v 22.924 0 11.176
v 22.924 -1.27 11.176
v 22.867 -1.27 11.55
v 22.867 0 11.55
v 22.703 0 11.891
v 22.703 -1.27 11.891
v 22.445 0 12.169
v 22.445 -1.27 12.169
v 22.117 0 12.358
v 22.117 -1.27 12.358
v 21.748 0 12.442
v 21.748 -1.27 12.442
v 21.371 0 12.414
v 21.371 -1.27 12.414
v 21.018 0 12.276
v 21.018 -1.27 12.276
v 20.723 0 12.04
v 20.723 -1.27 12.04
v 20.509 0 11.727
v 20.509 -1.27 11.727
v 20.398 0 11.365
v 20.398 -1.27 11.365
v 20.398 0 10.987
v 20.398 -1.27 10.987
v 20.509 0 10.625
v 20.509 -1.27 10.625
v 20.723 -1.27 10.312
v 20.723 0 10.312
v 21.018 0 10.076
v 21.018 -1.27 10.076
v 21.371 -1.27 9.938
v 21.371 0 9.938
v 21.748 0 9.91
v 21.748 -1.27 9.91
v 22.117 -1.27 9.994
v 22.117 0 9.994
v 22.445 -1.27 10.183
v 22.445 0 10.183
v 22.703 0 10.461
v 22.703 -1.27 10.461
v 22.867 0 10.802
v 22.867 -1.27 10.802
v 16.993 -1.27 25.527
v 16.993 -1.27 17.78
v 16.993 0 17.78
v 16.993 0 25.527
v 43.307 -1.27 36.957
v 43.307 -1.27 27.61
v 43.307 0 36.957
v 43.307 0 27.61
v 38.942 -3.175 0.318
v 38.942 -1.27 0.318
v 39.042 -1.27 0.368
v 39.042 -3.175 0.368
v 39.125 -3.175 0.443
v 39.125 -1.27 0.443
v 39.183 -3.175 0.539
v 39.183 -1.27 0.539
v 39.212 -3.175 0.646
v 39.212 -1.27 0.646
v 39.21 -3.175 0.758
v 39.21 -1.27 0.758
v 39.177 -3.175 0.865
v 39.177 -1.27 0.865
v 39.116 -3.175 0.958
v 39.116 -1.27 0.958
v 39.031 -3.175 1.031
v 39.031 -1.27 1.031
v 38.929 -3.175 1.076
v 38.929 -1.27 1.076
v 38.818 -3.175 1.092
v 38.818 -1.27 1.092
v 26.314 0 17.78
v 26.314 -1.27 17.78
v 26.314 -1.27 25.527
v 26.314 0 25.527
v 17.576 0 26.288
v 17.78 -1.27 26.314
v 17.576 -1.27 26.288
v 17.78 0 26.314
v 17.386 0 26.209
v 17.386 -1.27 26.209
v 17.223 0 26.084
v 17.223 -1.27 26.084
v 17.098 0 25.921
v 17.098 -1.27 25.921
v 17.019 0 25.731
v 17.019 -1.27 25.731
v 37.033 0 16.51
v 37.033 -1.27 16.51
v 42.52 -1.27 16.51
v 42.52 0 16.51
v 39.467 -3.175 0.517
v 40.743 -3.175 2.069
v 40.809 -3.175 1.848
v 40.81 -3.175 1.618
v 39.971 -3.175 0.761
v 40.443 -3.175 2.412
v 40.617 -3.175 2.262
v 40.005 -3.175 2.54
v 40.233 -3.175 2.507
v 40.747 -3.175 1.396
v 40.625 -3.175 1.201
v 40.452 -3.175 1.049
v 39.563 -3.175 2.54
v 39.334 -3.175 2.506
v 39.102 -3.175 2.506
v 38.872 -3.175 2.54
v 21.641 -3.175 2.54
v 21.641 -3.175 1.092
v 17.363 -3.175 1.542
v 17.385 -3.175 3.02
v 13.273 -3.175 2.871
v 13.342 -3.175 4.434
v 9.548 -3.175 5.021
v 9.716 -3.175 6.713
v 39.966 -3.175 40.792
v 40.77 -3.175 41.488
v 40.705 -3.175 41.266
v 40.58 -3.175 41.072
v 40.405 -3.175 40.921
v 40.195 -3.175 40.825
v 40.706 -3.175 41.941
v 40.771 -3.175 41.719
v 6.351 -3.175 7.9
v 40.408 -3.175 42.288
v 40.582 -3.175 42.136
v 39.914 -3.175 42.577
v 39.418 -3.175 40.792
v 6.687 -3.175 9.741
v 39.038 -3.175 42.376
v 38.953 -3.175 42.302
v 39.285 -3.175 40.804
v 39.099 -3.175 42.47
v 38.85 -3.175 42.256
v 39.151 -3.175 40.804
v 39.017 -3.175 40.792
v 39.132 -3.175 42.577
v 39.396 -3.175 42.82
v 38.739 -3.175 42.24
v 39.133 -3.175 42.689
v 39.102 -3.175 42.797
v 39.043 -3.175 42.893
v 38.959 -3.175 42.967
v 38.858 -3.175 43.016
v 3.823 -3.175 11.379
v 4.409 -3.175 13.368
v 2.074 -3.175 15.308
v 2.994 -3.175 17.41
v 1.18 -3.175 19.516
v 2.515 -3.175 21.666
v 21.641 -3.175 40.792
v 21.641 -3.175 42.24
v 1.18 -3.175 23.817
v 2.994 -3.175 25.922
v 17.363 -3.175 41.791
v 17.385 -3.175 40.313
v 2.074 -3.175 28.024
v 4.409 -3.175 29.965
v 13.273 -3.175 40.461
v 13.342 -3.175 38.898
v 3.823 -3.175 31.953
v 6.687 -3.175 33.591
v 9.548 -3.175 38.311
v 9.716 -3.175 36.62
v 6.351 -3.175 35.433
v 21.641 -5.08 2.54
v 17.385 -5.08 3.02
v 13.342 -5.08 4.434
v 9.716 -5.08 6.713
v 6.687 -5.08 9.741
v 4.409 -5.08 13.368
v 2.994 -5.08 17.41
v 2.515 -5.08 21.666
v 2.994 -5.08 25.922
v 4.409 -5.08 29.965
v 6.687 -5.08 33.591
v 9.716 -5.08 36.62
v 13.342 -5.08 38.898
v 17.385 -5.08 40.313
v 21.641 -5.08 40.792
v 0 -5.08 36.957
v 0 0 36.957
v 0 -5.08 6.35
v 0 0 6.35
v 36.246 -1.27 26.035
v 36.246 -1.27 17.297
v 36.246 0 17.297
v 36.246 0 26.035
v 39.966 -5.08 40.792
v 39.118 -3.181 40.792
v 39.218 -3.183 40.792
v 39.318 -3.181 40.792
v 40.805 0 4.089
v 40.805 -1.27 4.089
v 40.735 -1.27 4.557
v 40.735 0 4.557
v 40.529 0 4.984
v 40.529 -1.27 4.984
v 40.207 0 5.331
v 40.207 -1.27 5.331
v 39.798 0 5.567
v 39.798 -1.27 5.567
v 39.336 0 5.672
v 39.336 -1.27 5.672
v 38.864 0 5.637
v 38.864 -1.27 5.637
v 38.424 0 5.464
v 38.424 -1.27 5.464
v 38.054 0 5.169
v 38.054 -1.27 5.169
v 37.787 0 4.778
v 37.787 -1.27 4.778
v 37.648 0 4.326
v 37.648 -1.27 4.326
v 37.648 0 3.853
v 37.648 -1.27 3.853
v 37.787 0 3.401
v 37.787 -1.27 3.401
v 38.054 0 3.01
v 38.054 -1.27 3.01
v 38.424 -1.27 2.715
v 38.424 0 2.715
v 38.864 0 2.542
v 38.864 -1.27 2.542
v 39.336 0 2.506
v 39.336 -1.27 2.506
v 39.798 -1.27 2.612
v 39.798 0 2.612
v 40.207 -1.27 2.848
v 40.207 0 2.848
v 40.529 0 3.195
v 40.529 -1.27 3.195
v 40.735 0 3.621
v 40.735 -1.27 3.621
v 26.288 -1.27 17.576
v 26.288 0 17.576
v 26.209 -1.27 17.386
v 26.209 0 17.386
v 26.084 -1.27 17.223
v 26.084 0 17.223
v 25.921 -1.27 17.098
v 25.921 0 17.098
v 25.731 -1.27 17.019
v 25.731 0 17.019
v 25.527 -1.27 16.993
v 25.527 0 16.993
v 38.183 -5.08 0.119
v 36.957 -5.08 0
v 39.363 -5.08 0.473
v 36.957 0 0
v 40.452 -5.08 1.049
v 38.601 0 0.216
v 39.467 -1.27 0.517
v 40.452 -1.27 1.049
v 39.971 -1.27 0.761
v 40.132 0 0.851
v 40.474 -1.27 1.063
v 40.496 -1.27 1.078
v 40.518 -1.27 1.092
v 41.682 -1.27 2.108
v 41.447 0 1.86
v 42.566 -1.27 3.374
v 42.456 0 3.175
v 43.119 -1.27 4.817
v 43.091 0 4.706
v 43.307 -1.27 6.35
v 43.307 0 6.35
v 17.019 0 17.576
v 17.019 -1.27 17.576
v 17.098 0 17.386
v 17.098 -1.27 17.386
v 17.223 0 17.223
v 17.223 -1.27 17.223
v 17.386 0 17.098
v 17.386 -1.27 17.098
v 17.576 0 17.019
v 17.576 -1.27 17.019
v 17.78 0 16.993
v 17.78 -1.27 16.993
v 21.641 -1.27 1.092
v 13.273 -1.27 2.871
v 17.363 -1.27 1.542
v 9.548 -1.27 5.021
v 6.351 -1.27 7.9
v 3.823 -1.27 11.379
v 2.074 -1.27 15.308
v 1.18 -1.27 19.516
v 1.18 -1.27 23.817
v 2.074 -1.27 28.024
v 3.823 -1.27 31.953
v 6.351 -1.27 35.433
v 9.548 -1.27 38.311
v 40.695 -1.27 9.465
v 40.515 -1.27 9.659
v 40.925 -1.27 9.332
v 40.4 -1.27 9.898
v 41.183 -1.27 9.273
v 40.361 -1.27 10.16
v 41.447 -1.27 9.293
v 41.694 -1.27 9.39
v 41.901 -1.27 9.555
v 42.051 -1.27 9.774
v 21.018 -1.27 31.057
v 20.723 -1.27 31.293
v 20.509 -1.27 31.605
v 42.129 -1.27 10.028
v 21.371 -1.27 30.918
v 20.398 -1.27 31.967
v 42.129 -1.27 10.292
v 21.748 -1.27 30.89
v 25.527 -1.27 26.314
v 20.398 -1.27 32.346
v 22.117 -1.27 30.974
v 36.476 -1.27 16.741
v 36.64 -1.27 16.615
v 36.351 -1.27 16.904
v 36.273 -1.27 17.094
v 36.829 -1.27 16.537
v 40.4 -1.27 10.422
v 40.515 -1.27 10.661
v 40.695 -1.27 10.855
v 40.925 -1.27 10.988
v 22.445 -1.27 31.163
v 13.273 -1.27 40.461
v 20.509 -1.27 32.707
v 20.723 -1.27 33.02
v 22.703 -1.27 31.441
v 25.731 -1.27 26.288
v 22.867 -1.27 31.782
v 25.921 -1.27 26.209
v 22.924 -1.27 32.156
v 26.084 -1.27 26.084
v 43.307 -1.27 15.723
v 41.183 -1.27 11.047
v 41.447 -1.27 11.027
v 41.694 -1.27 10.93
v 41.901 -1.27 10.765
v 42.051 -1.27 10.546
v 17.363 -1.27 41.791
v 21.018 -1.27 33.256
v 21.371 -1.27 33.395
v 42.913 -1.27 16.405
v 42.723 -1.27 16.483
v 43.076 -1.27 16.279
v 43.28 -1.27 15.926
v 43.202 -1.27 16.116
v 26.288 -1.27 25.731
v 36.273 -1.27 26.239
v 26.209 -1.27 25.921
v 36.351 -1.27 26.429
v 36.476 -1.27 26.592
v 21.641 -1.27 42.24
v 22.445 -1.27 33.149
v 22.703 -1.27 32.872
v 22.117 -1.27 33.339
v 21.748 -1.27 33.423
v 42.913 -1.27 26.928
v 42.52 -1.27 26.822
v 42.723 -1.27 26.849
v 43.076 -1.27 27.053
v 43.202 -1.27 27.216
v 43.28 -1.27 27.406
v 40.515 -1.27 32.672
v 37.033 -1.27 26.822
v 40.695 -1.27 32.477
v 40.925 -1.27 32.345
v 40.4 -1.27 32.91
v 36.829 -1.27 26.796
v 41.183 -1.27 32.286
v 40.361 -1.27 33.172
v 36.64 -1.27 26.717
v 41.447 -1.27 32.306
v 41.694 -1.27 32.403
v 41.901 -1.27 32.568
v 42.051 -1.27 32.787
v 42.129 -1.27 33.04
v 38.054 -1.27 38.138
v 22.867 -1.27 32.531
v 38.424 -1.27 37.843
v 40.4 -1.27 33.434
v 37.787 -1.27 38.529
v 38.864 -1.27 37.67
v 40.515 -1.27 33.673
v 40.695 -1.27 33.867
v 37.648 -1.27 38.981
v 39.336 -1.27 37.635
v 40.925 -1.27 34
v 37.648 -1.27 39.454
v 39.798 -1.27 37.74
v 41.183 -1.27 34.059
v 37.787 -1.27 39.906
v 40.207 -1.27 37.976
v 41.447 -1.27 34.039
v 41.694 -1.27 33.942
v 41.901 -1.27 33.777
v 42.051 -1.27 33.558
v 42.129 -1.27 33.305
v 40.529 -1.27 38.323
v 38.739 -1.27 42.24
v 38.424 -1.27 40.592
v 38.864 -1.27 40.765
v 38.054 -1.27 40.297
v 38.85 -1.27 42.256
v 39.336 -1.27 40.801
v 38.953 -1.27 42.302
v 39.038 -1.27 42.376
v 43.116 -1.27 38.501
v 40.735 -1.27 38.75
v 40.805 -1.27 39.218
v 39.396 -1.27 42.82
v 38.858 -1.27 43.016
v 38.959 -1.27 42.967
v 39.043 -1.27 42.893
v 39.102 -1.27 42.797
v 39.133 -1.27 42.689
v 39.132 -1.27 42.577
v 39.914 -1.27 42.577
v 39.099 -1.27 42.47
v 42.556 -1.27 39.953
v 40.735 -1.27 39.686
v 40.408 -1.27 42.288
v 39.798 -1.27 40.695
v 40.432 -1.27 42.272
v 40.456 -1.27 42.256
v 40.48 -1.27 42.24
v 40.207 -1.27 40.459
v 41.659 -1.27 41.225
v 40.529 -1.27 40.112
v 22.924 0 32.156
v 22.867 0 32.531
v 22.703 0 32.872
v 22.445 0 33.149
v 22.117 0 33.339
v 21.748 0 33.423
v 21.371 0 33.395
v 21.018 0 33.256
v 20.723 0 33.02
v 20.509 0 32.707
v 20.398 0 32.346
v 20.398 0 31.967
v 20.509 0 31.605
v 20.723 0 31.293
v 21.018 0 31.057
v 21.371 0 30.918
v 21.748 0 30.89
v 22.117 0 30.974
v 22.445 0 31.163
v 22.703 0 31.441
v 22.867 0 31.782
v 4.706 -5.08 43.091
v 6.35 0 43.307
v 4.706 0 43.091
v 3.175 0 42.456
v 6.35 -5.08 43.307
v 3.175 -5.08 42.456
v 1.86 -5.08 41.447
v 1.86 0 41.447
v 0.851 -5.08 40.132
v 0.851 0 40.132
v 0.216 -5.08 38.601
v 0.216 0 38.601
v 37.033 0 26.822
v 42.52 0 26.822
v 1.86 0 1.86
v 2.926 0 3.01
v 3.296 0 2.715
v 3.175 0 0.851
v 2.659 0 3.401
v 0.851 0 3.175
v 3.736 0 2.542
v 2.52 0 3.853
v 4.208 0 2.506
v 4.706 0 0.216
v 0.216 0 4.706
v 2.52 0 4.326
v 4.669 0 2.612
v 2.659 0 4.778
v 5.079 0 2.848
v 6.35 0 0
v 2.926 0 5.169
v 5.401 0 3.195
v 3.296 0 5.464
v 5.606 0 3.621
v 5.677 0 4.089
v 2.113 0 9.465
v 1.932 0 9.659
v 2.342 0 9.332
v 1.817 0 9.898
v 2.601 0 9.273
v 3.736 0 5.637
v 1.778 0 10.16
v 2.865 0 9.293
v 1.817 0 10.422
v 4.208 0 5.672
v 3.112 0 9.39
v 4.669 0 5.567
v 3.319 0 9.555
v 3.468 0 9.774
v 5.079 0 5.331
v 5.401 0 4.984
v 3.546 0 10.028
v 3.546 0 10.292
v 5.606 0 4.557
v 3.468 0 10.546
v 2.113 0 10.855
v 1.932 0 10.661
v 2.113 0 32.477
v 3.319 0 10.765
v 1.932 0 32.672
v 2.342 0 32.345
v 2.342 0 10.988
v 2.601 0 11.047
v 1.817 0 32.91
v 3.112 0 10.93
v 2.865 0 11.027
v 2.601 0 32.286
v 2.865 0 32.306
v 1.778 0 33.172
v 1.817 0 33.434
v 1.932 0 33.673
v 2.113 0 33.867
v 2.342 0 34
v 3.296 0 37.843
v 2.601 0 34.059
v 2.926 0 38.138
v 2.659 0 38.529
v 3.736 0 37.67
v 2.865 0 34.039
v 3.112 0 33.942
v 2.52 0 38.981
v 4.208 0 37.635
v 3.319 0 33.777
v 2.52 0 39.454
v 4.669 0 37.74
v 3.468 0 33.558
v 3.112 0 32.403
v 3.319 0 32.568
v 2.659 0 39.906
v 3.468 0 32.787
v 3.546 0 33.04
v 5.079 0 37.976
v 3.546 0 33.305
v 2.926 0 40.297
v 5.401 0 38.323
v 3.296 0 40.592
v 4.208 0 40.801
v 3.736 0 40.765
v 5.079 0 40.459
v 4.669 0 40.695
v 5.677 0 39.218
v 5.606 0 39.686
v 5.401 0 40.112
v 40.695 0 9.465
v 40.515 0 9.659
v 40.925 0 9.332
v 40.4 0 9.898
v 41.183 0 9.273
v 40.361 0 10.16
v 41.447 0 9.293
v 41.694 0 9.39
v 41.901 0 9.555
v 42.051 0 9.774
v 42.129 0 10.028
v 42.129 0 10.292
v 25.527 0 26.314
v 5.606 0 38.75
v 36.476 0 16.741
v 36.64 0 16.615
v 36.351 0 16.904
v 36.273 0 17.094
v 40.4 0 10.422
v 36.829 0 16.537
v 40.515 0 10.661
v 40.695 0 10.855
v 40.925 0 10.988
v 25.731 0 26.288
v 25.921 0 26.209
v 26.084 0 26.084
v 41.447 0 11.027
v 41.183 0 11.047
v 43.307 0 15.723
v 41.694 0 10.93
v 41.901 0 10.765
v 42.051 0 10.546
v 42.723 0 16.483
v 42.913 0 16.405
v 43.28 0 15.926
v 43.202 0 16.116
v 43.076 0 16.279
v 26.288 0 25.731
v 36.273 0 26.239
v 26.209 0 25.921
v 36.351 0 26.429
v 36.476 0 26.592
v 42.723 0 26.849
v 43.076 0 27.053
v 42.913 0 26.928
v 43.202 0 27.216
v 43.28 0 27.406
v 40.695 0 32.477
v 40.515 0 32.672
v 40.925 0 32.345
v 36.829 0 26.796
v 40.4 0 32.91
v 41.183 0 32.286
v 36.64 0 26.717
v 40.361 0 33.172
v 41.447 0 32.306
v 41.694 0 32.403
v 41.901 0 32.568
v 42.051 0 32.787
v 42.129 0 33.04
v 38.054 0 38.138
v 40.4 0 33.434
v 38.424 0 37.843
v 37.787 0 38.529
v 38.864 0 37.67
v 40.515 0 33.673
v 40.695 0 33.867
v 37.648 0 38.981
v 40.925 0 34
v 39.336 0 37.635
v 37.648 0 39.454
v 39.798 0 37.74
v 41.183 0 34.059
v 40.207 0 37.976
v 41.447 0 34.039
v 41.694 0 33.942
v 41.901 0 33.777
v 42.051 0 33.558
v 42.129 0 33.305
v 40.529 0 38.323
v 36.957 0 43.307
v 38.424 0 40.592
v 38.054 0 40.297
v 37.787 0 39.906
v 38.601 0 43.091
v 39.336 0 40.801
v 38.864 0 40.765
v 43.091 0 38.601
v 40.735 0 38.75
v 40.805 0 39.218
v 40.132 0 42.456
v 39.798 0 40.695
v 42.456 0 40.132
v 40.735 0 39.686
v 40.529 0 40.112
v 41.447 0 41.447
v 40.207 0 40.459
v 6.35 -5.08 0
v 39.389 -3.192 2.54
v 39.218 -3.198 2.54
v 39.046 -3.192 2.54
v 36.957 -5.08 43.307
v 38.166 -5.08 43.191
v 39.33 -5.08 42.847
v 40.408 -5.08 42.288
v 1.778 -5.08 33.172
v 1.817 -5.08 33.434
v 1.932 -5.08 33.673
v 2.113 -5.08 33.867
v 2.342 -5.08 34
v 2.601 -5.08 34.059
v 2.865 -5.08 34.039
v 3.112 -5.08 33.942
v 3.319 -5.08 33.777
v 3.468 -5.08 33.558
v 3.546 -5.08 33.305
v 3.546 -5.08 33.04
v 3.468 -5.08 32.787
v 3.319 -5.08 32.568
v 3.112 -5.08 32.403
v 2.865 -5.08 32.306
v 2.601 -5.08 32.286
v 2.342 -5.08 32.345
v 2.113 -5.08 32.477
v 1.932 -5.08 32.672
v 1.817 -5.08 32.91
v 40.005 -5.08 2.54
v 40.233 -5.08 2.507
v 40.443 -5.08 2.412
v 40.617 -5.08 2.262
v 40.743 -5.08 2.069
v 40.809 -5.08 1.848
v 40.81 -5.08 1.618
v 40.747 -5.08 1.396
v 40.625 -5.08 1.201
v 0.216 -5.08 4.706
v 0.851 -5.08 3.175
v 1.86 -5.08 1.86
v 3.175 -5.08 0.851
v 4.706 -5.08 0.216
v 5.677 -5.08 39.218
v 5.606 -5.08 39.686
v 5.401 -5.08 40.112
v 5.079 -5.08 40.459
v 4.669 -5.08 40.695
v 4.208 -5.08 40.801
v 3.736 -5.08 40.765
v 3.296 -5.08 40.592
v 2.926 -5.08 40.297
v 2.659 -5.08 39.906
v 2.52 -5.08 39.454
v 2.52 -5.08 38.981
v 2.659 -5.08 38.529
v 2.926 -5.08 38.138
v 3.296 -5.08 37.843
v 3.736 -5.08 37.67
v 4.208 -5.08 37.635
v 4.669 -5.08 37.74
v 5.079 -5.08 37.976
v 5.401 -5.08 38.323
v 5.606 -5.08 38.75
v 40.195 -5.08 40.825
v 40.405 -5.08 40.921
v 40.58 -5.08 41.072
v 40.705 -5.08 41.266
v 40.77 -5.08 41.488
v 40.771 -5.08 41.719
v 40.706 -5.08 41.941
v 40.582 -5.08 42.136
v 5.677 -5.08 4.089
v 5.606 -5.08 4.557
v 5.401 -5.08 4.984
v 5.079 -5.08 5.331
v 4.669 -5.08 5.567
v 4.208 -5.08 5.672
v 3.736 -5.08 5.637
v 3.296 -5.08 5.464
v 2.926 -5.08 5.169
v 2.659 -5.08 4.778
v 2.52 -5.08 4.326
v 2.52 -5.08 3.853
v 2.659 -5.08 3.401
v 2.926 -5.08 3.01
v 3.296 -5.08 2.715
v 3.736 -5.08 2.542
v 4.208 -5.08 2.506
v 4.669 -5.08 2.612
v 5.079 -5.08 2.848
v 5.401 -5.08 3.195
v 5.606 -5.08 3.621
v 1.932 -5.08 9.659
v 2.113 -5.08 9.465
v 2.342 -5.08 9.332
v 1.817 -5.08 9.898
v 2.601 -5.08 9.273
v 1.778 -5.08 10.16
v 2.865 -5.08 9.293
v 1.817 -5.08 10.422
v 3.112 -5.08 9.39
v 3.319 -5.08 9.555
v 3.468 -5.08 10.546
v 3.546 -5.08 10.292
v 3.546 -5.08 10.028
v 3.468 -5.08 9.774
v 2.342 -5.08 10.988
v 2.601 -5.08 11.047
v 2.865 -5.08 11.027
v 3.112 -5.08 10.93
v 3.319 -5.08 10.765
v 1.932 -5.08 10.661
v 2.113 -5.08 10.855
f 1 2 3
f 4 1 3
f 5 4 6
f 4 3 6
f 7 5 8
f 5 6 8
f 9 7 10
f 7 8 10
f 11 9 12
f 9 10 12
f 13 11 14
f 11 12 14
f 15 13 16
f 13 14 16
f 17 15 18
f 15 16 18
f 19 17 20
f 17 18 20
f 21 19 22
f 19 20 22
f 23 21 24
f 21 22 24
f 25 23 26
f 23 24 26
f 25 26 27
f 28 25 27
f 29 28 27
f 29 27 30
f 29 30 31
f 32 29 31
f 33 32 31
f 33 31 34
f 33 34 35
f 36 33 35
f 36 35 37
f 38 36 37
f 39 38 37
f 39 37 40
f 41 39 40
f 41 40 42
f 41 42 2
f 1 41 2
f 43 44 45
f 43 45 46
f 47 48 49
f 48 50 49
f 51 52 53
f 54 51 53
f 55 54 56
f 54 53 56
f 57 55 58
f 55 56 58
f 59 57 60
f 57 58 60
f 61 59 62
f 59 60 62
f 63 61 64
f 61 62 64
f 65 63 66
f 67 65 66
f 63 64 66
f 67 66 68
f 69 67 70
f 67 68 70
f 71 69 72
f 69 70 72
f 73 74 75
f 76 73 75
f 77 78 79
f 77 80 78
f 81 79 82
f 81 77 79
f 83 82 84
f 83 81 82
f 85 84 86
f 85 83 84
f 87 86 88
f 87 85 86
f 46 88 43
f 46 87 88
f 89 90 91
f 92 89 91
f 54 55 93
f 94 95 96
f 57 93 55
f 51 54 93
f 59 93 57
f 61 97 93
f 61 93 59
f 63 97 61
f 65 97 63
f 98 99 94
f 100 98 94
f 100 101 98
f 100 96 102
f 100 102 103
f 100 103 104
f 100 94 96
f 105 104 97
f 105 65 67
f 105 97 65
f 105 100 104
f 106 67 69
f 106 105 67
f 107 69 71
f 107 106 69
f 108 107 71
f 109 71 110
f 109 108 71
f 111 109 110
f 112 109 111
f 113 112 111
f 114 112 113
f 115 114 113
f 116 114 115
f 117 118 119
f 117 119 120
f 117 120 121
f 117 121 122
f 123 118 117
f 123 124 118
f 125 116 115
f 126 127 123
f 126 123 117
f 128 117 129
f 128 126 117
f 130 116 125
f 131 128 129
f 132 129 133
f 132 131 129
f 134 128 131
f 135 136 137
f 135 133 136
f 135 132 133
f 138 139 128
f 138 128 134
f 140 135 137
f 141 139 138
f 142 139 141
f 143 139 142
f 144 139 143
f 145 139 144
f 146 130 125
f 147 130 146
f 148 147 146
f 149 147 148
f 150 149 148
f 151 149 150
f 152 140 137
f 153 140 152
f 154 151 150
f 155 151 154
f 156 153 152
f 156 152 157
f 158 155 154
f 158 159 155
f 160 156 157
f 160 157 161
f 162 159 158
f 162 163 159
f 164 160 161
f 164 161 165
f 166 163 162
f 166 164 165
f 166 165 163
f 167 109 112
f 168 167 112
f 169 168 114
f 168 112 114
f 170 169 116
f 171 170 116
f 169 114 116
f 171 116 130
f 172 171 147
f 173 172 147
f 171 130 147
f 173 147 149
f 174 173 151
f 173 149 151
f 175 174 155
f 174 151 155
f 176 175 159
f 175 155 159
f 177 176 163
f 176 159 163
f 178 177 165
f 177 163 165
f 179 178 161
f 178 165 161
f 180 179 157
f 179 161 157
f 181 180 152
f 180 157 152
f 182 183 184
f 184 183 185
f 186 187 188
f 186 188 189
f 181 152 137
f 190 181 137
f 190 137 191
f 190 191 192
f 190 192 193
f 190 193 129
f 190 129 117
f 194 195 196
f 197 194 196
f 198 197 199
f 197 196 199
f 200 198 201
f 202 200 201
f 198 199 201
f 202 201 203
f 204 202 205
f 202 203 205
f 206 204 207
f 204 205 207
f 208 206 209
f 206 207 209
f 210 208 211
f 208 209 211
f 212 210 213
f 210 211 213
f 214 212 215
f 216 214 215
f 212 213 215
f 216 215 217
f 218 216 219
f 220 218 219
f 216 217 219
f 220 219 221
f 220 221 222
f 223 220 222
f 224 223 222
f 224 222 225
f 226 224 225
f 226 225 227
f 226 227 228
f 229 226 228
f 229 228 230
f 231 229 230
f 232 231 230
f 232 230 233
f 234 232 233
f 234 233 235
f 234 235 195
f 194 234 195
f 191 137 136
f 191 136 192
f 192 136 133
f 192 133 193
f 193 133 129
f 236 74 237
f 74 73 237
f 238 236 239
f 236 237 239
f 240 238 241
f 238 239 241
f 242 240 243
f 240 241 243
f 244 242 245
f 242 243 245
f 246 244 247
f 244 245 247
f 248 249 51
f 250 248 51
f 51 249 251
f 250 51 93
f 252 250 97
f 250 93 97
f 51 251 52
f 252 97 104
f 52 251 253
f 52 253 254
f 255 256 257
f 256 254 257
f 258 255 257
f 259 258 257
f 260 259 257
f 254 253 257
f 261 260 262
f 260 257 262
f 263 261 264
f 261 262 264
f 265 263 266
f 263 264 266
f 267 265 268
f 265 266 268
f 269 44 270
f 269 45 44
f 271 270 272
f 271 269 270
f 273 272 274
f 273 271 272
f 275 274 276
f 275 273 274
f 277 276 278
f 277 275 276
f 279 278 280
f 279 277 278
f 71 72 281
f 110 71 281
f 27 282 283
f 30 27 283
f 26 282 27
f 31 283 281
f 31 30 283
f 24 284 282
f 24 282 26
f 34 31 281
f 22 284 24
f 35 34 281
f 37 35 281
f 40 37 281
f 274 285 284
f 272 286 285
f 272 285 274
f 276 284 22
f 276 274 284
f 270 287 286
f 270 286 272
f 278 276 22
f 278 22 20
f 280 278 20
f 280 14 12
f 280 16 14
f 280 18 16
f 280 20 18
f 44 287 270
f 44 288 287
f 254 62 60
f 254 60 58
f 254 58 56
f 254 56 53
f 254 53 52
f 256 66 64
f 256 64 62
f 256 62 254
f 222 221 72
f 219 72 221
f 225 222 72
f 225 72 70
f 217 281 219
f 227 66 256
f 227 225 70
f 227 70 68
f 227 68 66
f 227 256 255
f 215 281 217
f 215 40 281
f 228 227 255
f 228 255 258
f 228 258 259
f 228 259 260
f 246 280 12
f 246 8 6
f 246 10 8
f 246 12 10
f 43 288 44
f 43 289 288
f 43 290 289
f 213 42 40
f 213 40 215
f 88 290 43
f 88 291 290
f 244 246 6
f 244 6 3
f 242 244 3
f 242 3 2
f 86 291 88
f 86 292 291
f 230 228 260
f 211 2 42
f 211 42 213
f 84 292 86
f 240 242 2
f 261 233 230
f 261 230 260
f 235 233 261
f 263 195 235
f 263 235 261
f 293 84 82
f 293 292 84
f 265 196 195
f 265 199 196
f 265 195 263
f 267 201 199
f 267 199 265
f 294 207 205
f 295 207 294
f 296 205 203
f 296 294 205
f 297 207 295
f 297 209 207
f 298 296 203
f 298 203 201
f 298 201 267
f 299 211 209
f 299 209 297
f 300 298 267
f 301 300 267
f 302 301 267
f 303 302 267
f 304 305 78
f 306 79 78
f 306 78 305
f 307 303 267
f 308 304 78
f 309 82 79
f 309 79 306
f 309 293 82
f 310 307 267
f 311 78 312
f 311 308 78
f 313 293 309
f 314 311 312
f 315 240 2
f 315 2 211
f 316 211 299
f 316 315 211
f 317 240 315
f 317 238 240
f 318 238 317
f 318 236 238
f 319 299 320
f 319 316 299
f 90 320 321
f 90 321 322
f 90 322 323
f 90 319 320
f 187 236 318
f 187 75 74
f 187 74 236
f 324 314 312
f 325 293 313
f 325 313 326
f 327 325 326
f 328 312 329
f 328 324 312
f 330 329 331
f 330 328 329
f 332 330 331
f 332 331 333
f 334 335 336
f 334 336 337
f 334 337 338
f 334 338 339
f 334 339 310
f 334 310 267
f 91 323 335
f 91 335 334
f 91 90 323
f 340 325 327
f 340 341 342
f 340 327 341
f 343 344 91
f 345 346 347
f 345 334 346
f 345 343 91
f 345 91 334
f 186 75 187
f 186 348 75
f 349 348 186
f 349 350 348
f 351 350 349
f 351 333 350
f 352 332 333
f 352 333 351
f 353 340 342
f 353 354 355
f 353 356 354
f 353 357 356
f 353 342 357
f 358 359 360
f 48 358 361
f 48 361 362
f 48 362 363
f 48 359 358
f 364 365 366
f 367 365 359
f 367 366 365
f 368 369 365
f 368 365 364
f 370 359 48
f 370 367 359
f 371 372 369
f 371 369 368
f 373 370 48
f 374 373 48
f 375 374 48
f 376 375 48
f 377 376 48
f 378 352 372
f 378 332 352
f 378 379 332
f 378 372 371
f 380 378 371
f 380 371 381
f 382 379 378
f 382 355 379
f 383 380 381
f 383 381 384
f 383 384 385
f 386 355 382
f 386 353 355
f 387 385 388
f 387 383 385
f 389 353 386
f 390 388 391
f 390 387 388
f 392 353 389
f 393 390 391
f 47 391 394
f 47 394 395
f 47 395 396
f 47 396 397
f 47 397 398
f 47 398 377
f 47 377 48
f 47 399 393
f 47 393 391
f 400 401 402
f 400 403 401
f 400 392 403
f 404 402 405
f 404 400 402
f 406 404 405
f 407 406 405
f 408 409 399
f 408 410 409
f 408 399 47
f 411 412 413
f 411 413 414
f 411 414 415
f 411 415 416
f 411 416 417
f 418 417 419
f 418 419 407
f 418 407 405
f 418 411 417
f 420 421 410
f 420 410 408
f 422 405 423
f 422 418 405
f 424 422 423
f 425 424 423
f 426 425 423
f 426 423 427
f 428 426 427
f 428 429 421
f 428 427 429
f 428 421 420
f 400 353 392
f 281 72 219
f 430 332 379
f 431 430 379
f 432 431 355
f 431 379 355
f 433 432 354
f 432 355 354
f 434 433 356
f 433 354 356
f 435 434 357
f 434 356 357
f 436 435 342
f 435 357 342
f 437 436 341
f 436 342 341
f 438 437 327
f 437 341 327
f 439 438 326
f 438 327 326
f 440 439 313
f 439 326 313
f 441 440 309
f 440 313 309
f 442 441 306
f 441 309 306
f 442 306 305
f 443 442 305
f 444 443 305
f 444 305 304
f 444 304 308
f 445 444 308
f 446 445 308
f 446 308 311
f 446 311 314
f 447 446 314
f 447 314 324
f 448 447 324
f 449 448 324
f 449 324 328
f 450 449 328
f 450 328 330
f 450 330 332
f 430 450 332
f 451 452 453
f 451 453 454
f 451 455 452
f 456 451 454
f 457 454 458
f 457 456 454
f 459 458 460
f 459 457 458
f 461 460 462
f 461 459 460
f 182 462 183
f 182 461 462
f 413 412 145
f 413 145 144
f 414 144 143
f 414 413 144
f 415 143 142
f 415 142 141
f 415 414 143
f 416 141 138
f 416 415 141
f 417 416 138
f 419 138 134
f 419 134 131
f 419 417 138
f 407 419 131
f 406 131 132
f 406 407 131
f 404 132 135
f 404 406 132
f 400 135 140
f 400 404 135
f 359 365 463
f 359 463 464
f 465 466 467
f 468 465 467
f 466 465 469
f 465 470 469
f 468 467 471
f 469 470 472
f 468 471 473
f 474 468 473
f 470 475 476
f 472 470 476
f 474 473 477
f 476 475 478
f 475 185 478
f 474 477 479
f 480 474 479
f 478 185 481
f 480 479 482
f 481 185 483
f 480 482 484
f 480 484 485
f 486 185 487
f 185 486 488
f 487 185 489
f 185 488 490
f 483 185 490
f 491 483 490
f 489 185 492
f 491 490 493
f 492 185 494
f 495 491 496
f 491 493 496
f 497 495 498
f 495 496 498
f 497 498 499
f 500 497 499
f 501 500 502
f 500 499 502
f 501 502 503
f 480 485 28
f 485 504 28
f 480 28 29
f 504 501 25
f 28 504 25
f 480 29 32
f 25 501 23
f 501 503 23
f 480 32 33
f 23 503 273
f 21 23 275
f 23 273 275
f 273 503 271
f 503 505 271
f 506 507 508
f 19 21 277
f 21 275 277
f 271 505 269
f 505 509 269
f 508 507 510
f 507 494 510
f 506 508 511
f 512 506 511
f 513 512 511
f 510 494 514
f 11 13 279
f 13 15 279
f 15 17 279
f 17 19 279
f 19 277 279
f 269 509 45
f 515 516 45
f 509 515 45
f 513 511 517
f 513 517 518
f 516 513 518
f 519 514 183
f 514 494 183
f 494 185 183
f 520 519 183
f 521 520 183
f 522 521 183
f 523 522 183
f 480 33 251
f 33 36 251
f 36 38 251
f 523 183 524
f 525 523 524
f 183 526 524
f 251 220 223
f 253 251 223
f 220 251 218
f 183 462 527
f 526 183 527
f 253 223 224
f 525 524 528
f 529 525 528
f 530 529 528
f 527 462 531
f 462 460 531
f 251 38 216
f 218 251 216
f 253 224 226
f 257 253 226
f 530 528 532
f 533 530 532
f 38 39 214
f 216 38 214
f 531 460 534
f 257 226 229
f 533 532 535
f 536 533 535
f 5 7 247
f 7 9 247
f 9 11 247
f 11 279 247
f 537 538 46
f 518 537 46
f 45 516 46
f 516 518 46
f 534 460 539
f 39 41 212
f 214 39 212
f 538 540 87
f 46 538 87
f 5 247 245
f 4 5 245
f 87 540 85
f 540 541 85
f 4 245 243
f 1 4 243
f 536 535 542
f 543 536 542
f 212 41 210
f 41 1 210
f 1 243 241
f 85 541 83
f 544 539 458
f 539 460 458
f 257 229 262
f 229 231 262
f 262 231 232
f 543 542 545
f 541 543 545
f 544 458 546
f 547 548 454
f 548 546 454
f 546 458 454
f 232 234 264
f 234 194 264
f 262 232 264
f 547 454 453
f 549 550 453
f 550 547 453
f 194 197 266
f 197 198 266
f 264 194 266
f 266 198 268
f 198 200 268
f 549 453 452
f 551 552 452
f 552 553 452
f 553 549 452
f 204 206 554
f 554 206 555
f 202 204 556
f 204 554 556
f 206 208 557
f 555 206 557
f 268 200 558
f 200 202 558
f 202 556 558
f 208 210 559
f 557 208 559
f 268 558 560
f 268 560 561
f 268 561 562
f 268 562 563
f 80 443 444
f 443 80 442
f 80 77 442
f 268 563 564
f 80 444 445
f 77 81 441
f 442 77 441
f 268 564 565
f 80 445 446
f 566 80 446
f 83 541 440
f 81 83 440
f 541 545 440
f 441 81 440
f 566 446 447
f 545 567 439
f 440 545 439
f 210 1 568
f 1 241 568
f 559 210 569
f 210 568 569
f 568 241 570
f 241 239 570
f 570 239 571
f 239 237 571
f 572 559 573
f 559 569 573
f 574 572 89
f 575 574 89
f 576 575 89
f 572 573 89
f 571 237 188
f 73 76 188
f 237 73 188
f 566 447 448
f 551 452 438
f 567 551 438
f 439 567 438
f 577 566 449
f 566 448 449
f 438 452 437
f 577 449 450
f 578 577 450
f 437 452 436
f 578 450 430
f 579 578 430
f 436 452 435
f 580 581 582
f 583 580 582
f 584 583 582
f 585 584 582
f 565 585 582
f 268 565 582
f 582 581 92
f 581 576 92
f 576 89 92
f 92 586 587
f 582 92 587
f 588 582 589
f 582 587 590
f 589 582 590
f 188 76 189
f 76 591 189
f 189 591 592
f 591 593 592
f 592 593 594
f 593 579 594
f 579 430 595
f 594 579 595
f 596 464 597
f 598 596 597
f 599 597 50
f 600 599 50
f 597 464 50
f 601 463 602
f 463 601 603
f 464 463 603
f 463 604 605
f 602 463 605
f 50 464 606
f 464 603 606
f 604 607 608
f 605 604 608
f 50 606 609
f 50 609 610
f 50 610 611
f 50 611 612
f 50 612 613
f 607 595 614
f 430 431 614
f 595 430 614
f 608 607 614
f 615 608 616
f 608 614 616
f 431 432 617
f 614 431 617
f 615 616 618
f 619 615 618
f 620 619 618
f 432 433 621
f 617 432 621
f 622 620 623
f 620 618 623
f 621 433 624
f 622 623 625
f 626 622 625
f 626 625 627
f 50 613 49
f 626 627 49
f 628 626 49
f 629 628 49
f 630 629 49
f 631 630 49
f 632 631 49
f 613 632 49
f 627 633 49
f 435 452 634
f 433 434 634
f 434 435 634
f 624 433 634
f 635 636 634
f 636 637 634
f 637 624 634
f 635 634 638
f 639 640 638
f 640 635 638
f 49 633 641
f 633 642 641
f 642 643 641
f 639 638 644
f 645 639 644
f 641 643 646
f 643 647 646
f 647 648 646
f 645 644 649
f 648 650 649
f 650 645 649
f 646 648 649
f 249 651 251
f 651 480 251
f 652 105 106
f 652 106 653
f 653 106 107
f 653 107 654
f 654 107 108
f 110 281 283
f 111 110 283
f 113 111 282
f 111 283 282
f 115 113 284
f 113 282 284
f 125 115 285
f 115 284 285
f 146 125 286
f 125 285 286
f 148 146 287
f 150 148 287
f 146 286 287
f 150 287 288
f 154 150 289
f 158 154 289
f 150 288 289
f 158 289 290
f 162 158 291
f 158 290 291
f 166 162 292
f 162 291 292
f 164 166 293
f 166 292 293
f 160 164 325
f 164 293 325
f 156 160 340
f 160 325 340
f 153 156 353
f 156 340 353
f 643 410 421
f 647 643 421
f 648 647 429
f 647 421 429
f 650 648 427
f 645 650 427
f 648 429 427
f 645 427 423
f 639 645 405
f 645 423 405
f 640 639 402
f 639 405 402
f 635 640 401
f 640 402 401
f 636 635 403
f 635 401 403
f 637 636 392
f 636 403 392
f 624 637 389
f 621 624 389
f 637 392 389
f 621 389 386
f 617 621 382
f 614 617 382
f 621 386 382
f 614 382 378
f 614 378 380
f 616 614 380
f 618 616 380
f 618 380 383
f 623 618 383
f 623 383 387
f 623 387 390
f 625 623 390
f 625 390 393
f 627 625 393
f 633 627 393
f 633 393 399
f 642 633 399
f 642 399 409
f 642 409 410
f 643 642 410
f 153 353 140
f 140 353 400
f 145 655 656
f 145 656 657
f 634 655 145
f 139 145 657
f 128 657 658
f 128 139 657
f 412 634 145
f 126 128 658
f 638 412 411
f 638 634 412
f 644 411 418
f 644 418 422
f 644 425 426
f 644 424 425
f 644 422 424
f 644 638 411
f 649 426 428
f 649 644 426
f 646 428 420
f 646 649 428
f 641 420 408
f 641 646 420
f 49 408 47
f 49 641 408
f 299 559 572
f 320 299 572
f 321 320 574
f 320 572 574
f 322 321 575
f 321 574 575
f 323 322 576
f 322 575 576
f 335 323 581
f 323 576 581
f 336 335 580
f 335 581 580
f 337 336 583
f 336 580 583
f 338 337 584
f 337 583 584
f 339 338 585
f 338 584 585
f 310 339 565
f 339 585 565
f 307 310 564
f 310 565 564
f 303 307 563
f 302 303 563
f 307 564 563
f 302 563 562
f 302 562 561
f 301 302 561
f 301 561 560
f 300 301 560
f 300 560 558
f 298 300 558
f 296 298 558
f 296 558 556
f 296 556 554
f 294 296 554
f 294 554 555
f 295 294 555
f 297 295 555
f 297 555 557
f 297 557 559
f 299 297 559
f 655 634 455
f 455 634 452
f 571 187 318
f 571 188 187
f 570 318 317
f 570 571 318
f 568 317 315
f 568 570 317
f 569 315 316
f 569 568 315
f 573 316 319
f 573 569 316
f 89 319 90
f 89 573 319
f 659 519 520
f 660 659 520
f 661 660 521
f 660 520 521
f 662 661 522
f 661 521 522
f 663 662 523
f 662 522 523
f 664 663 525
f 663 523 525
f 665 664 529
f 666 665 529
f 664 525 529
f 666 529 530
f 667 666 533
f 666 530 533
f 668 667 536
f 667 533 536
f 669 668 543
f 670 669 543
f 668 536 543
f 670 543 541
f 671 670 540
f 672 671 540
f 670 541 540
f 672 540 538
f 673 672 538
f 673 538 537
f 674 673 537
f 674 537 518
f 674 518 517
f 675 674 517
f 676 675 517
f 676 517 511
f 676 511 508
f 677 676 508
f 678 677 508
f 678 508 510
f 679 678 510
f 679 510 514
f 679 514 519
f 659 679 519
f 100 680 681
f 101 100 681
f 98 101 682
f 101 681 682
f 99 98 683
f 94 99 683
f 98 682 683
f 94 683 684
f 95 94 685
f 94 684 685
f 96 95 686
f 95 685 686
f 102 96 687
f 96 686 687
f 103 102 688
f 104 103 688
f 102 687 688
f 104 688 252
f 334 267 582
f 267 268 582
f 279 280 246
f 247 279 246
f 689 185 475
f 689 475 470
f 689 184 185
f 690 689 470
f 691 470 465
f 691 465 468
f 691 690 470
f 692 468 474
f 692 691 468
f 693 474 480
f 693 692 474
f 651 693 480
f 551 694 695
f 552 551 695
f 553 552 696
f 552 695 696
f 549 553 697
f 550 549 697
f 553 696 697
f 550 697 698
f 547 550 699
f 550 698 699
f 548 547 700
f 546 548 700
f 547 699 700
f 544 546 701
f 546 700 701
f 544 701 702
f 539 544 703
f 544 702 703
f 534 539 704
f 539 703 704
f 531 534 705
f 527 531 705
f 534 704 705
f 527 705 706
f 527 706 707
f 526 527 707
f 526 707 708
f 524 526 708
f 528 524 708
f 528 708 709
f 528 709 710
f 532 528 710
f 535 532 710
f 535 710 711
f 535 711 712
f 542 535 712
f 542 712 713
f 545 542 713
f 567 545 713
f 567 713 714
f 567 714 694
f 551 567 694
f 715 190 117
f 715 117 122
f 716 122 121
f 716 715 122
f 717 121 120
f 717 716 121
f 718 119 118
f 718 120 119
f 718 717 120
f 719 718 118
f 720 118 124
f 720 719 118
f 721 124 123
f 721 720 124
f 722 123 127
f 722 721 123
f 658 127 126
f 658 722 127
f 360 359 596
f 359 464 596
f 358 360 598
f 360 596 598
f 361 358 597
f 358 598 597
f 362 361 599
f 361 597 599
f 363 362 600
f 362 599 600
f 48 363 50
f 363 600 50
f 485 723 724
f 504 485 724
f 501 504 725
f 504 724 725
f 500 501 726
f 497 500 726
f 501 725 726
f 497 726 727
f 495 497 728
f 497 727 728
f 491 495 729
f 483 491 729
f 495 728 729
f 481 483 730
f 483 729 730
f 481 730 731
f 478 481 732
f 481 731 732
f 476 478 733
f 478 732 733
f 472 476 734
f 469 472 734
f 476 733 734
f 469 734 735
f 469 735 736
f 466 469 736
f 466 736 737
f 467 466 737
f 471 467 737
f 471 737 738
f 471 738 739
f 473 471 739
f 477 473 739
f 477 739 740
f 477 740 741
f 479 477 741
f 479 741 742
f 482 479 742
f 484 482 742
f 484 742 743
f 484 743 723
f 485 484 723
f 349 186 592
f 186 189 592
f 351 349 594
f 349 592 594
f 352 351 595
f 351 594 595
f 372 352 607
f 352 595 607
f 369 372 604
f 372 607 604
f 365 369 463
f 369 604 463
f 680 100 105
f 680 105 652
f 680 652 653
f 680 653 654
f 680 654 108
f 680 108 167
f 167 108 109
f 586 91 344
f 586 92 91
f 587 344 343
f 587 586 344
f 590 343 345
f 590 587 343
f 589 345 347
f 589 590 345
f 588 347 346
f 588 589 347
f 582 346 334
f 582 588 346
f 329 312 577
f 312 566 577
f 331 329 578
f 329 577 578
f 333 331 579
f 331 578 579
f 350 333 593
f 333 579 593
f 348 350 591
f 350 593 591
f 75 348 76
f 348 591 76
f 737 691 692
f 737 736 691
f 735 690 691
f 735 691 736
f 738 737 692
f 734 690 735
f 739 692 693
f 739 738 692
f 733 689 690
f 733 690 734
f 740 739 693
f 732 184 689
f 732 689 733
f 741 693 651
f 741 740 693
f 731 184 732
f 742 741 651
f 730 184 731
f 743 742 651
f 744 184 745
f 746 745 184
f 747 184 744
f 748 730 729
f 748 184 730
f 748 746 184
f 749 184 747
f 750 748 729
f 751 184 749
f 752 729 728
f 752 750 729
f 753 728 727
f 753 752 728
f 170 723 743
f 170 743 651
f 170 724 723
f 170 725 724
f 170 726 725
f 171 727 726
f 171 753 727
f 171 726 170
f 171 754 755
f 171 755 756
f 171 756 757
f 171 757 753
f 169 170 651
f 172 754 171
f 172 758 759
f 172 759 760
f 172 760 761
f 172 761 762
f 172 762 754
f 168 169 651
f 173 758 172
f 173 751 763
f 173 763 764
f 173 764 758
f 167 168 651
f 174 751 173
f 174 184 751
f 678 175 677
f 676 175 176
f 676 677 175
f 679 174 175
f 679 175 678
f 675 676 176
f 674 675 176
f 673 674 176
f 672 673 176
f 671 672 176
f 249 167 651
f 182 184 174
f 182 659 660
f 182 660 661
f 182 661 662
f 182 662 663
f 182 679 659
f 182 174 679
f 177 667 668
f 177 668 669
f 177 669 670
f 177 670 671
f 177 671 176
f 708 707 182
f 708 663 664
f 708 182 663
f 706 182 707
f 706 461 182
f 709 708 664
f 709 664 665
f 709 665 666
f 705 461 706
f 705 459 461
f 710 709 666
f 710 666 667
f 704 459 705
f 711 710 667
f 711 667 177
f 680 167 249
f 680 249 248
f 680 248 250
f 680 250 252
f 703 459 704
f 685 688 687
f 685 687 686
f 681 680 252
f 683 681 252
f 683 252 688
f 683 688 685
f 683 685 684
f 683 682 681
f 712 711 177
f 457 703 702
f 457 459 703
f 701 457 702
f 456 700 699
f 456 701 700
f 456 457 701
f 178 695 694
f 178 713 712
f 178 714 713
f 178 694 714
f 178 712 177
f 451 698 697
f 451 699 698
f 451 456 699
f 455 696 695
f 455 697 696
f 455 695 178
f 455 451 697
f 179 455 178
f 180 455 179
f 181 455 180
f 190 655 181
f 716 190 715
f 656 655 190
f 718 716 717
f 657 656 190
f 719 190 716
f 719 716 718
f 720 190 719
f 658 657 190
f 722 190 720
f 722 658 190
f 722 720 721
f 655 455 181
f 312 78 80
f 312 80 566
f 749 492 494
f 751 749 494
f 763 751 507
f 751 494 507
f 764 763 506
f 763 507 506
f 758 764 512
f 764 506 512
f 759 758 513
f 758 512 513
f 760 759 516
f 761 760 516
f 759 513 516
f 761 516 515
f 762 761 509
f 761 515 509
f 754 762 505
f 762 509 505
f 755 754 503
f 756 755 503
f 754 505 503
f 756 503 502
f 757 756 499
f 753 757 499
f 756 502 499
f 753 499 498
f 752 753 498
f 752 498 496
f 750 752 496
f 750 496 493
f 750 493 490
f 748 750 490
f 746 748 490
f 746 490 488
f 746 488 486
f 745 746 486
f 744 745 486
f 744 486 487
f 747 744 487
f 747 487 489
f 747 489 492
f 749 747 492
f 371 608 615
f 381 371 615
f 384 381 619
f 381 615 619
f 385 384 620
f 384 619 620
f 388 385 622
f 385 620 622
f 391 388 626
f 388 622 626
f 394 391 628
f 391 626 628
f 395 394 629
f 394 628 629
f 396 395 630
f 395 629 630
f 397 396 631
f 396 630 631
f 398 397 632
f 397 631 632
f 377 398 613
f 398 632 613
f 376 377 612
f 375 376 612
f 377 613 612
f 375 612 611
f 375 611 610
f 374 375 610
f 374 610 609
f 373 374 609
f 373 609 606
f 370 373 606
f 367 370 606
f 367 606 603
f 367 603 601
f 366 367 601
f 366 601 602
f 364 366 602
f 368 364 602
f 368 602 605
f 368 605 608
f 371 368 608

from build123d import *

# Parameters (mm, degrees)
F0_W         = 43.307
F0_H         = 43.307
F1_DEPTH     = 1.27
F3_DEPTH     = 3.175
F5_DEPTH     = 1.905
F6_R         = 0.889
F7_DEPTH     = 5.081
F8_W         = 9.3218
F8_H         = 9.3218
F8_W_2       = 7.0612
F8_H_2       = 10.3124
F10_DEPTH    = 1.27
F11_D        = 3.175
F14_D        = 2.54
F15_R        = 6.35
F16_T4_DEPTH = 12.7851645967
F16_T9_DEPTH = 12.8907938144
F17_R        = 0.7874
F18_D        = 3.175
F18_DEPTH    = 3.175
F18_TIP      = 0.9538662327
F19_T4_DEPTH = 6.3848359064
F19_T9_DEPTH = 6.2809008493


# Not quite as in the source:
# - a fillet or chamfer that OpenCascade refuses, or shapes differently, is made with other operations: its cross-section is extruded or revolved along the edge and cut away or added


with BuildPart() as f1:
    # F0 (on Front) → F1 (new body)
    with BuildSketch(Plane.XZ):
        with Locations((21.6535, 21.6535)):
            Rectangle(F0_W, F0_H)
    extrude(amount=F1_DEPTH)

    # F2 (on Front) → F3 (join)
    with BuildSketch(Plane.XZ):
        with BuildLine():
            Line((43.307, 43.307), (0, 43.307))
            Line((0, 43.307), (0, 0))
            Line((0, 0), (43.307, 0))
            Line((43.307, 0), (43.307, 1.0922))
            Line((43.307, 1.0922), (21.6408, 1.0922))
            ThreePointArc((21.6408, 1.0922), (1.0668, 21.6662), (21.6408, 42.2402))
            Line((21.6408, 42.2402), (43.307, 42.2402))
            Line((43.307, 42.2402), (43.307, 43.307))
        make_face()
    extrude(amount=F3_DEPTH)

    # F4 (on face) → F5 (join)
    with BuildSketch(Plane.XZ.offset(3.175)):
        with BuildLine():
            Line((43.307, 43.307), (0, 43.307))
            Line((0, 43.307), (0, 0))
            Line((0, 0), (43.307, 0))
            Line((43.307, 0), (43.307, 2.54))
            Line((43.307, 2.54), (21.6408, 2.54))
            ThreePointArc((21.6408, 2.54), (2.5146, 21.6662), (21.6408, 40.7924))
            Line((21.6408, 40.7924), (43.307, 40.7924))
            Line((43.307, 40.7924), (43.307, 43.307))
        make_face()
    extrude(amount=F5_DEPTH)

    # F6 (on face) → F7 (cut, through all)
    with BuildSketch(Plane(origin=(0, 0, 0), x_dir=(-1, 0, 0), z_dir=(0, 1, 0))):
        with Locations((-41.2496, 33.1724)):
            Circle(F6_R)
        with Locations((-2.667, 33.1724)):
            Circle(F6_R)
        with Locations((-41.2496, 10.16)):
            Circle(F6_R)
        with Locations((-2.667, 10.16)):
            Circle(F6_R)
    extrude(amount=-F7_DEPTH, mode=Mode.SUBTRACT)

    # F8 (on face) → F10 (cut, through all)
    with BuildSketch(Plane.XZ.offset(1.27)):
        with Locations((21.6535, 21.6535)):
            Rectangle(F8_W, F8_H)
        with Locations((39.7764, 21.6662)):
            Rectangle(F8_W_2, F8_H_2)
    extrude(amount=-F10_DEPTH, mode=Mode.SUBTRACT)

    # F11 (through all)
    with Locations(Plane(origin=(0, 0, 0), x_dir=(-1, 0, 0), z_dir=(0, 1, 0))):
        with Locations((-4.0894, 39.2176), (-4.0894, 4.0894)):
            Hole(F11_D / 2)

    # F14 (through all)
    with Locations(Plane(origin=(0, 0, 0), x_dir=(-1, 0, 0), z_dir=(0, 1, 0))):
        with Locations((-21.6535, 32.1564), (-21.6535, 11.176)):
            Hole(F14_D / 2)

    # F15
    f15_edges = [f1.edges().sort_by_distance(p)[0] for p in [
        (0, -2.54, 43.307),
        (43.307, -2.54, 43.307),
        (43.307, -2.54, 0),
        (0, -2.54, 0),
    ]]
    fillet(f15_edges, radius=F15_R)

    # F16: fillet of radius 0.8128 on 2 edges, made by hand


with BuildPart() as f16_tool2:
    # F16_s3 → F16_t4 (new body)
    with BuildSketch(Plane.XZ.offset(10.5200822984)):
        with BuildLine():
            ThreePointArc((40.005, 2.54), (40.7835212046, 1.9607563614), (40.452412844, 1.0486238532))
            ThreePointArc((40.452412844, 1.0486238532), (41.3090658387, 1.7259300464), (42.037, 2.54))
            Line((42.037, 2.54), (40.005, 2.54))
        make_face()
    extrude(amount=-F16_T4_DEPTH)

    split(bisect_by=Plane.XZ.offset(1.27), keep=Keep.TOP)


with BuildPart() as f1_1:
    add(f1.part)

    # F16_t1: cut F16_tool2
    add(f16_tool2.part, mode=Mode.SUBTRACT)


with BuildPart() as f16_tool7:
    # F16_s8 → F16_t9 (new body)
    with BuildSketch(Plane.XZ.offset(10.5728969072)):
        with BuildLine():
            ThreePointArc((39.9661228955, 40.7924), (40.7456166441, 41.374910322), (40.4078290086, 42.2875045872))
            ThreePointArc((40.4078290086, 42.2875045872), (41.2779959557, 41.6101165847), (42.0178504068, 40.7924))
            Line((42.0178504068, 40.7924), (39.9661228955, 40.7924))
        make_face()
    extrude(amount=-F16_T9_DEPTH)

    split(bisect_by=Plane.XZ.offset(1.27), keep=Keep.TOP)


with BuildPart() as f1_2:
    add(f1_1.part)

    # F16_t6: cut F16_tool7
    add(f16_tool7.part, mode=Mode.SUBTRACT)

    # F17
    f17_edges = [f1_2.edges().sort_by_distance(p)[0] for p in [
        (43.307, -0.635, 26.8224),
        (36.2458, -0.635, 26.8224),
        (16.9926, -0.635, 26.3144),
        (16.9926, -0.635, 16.9926),
        (26.3144, -0.635, 16.9926),
        (43.307, -0.635, 16.51),
        (36.2458, -0.635, 16.51),
        (26.3144, -0.635, 26.3144),
    ]]
    fillet(f17_edges, radius=F17_R)

    # F18
    with Locations(Plane(origin=(0, 0, 0), x_dir=(-1, 0, 0), z_dir=(0, 1, 0))):
        with Locations((-39.2176, 4.0894), (-39.2176, 39.2176)):
            Hole(F18_D / 2, depth=F18_DEPTH)
            with Locations((0, 0, -(F18_DEPTH + F18_TIP / 2))):  # 118° drill point
                Cone(0, F18_D / 2, F18_TIP, mode=Mode.SUBTRACT)

    # F19: fillet of radius 0.396875 on 2 edges, made by hand


with BuildPart() as f19_tool2:
    # F19_s3 → F19_t4 (new body)
    with BuildSketch(Plane.XZ.offset(-3.2098359064)):
        with BuildLine():
            ThreePointArc((38.8580757032, 43.0157466667), (39.1315562434, 42.57697322), (38.7392584717, 42.2402))
            Line((38.7392584717, 42.2402), (38.7392584717, 42.2005125))
            Line((38.7392584717, 42.2005125), (40.4734874982, 42.2005125))
            Line((40.4734874982, 42.2005125), (40.4982611604, 42.2712058594))
            ThreePointArc((40.4982611604, 42.2712058594), (40.4293966899, 42.3208202408), (38.8699574263, 43.0536138333))
            Line((38.8699574263, 43.0536138333), (38.8580757032, 43.0157466667))
        make_face()
    extrude(amount=F19_T4_DEPTH)

    split(bisect_by=Plane.XZ.offset(1.27), keep=Keep.TOP)


with BuildPart() as f1_3:
    add(f1_2.part)

    # F19_t1: cut F19_tool2
    add(f19_tool2.part, mode=Mode.SUBTRACT)


with BuildPart() as f19_tool7:
    # F19_s8 → F19_t9 (new body)
    with BuildSketch(Plane.XZ.offset(-3.1059008493)):
        with BuildLine():
            ThreePointArc((38.9423609411, 0.3183466667), (39.2101451473, 0.7581600602), (38.8182758823, 1.0922))
            Line((38.8182758823, 1.0922), (38.8182758823, 1.1318875))
            Line((38.8182758823, 1.1318875), (40.5123646026, 1.1318875))
            Line((40.5123646026, 1.1318875), (40.5371382648, 1.0611941406))
            ThreePointArc((40.5371382648, 1.0611941406), (40.4742591743, 1.0154902523), (38.954769447, 0.2806488333))
            Line((38.954769447, 0.2806488333), (38.9423609411, 0.3183466667))
        make_face()
    extrude(amount=F19_T9_DEPTH)

    split(bisect_by=Plane.XZ.offset(1.27), keep=Keep.TOP)


with BuildPart() as f1_4:
    add(f1_3.part)

    # F19_t6: cut F19_tool7
    add(f19_tool7.part, mode=Mode.SUBTRACT)


solid = f1_4.part
